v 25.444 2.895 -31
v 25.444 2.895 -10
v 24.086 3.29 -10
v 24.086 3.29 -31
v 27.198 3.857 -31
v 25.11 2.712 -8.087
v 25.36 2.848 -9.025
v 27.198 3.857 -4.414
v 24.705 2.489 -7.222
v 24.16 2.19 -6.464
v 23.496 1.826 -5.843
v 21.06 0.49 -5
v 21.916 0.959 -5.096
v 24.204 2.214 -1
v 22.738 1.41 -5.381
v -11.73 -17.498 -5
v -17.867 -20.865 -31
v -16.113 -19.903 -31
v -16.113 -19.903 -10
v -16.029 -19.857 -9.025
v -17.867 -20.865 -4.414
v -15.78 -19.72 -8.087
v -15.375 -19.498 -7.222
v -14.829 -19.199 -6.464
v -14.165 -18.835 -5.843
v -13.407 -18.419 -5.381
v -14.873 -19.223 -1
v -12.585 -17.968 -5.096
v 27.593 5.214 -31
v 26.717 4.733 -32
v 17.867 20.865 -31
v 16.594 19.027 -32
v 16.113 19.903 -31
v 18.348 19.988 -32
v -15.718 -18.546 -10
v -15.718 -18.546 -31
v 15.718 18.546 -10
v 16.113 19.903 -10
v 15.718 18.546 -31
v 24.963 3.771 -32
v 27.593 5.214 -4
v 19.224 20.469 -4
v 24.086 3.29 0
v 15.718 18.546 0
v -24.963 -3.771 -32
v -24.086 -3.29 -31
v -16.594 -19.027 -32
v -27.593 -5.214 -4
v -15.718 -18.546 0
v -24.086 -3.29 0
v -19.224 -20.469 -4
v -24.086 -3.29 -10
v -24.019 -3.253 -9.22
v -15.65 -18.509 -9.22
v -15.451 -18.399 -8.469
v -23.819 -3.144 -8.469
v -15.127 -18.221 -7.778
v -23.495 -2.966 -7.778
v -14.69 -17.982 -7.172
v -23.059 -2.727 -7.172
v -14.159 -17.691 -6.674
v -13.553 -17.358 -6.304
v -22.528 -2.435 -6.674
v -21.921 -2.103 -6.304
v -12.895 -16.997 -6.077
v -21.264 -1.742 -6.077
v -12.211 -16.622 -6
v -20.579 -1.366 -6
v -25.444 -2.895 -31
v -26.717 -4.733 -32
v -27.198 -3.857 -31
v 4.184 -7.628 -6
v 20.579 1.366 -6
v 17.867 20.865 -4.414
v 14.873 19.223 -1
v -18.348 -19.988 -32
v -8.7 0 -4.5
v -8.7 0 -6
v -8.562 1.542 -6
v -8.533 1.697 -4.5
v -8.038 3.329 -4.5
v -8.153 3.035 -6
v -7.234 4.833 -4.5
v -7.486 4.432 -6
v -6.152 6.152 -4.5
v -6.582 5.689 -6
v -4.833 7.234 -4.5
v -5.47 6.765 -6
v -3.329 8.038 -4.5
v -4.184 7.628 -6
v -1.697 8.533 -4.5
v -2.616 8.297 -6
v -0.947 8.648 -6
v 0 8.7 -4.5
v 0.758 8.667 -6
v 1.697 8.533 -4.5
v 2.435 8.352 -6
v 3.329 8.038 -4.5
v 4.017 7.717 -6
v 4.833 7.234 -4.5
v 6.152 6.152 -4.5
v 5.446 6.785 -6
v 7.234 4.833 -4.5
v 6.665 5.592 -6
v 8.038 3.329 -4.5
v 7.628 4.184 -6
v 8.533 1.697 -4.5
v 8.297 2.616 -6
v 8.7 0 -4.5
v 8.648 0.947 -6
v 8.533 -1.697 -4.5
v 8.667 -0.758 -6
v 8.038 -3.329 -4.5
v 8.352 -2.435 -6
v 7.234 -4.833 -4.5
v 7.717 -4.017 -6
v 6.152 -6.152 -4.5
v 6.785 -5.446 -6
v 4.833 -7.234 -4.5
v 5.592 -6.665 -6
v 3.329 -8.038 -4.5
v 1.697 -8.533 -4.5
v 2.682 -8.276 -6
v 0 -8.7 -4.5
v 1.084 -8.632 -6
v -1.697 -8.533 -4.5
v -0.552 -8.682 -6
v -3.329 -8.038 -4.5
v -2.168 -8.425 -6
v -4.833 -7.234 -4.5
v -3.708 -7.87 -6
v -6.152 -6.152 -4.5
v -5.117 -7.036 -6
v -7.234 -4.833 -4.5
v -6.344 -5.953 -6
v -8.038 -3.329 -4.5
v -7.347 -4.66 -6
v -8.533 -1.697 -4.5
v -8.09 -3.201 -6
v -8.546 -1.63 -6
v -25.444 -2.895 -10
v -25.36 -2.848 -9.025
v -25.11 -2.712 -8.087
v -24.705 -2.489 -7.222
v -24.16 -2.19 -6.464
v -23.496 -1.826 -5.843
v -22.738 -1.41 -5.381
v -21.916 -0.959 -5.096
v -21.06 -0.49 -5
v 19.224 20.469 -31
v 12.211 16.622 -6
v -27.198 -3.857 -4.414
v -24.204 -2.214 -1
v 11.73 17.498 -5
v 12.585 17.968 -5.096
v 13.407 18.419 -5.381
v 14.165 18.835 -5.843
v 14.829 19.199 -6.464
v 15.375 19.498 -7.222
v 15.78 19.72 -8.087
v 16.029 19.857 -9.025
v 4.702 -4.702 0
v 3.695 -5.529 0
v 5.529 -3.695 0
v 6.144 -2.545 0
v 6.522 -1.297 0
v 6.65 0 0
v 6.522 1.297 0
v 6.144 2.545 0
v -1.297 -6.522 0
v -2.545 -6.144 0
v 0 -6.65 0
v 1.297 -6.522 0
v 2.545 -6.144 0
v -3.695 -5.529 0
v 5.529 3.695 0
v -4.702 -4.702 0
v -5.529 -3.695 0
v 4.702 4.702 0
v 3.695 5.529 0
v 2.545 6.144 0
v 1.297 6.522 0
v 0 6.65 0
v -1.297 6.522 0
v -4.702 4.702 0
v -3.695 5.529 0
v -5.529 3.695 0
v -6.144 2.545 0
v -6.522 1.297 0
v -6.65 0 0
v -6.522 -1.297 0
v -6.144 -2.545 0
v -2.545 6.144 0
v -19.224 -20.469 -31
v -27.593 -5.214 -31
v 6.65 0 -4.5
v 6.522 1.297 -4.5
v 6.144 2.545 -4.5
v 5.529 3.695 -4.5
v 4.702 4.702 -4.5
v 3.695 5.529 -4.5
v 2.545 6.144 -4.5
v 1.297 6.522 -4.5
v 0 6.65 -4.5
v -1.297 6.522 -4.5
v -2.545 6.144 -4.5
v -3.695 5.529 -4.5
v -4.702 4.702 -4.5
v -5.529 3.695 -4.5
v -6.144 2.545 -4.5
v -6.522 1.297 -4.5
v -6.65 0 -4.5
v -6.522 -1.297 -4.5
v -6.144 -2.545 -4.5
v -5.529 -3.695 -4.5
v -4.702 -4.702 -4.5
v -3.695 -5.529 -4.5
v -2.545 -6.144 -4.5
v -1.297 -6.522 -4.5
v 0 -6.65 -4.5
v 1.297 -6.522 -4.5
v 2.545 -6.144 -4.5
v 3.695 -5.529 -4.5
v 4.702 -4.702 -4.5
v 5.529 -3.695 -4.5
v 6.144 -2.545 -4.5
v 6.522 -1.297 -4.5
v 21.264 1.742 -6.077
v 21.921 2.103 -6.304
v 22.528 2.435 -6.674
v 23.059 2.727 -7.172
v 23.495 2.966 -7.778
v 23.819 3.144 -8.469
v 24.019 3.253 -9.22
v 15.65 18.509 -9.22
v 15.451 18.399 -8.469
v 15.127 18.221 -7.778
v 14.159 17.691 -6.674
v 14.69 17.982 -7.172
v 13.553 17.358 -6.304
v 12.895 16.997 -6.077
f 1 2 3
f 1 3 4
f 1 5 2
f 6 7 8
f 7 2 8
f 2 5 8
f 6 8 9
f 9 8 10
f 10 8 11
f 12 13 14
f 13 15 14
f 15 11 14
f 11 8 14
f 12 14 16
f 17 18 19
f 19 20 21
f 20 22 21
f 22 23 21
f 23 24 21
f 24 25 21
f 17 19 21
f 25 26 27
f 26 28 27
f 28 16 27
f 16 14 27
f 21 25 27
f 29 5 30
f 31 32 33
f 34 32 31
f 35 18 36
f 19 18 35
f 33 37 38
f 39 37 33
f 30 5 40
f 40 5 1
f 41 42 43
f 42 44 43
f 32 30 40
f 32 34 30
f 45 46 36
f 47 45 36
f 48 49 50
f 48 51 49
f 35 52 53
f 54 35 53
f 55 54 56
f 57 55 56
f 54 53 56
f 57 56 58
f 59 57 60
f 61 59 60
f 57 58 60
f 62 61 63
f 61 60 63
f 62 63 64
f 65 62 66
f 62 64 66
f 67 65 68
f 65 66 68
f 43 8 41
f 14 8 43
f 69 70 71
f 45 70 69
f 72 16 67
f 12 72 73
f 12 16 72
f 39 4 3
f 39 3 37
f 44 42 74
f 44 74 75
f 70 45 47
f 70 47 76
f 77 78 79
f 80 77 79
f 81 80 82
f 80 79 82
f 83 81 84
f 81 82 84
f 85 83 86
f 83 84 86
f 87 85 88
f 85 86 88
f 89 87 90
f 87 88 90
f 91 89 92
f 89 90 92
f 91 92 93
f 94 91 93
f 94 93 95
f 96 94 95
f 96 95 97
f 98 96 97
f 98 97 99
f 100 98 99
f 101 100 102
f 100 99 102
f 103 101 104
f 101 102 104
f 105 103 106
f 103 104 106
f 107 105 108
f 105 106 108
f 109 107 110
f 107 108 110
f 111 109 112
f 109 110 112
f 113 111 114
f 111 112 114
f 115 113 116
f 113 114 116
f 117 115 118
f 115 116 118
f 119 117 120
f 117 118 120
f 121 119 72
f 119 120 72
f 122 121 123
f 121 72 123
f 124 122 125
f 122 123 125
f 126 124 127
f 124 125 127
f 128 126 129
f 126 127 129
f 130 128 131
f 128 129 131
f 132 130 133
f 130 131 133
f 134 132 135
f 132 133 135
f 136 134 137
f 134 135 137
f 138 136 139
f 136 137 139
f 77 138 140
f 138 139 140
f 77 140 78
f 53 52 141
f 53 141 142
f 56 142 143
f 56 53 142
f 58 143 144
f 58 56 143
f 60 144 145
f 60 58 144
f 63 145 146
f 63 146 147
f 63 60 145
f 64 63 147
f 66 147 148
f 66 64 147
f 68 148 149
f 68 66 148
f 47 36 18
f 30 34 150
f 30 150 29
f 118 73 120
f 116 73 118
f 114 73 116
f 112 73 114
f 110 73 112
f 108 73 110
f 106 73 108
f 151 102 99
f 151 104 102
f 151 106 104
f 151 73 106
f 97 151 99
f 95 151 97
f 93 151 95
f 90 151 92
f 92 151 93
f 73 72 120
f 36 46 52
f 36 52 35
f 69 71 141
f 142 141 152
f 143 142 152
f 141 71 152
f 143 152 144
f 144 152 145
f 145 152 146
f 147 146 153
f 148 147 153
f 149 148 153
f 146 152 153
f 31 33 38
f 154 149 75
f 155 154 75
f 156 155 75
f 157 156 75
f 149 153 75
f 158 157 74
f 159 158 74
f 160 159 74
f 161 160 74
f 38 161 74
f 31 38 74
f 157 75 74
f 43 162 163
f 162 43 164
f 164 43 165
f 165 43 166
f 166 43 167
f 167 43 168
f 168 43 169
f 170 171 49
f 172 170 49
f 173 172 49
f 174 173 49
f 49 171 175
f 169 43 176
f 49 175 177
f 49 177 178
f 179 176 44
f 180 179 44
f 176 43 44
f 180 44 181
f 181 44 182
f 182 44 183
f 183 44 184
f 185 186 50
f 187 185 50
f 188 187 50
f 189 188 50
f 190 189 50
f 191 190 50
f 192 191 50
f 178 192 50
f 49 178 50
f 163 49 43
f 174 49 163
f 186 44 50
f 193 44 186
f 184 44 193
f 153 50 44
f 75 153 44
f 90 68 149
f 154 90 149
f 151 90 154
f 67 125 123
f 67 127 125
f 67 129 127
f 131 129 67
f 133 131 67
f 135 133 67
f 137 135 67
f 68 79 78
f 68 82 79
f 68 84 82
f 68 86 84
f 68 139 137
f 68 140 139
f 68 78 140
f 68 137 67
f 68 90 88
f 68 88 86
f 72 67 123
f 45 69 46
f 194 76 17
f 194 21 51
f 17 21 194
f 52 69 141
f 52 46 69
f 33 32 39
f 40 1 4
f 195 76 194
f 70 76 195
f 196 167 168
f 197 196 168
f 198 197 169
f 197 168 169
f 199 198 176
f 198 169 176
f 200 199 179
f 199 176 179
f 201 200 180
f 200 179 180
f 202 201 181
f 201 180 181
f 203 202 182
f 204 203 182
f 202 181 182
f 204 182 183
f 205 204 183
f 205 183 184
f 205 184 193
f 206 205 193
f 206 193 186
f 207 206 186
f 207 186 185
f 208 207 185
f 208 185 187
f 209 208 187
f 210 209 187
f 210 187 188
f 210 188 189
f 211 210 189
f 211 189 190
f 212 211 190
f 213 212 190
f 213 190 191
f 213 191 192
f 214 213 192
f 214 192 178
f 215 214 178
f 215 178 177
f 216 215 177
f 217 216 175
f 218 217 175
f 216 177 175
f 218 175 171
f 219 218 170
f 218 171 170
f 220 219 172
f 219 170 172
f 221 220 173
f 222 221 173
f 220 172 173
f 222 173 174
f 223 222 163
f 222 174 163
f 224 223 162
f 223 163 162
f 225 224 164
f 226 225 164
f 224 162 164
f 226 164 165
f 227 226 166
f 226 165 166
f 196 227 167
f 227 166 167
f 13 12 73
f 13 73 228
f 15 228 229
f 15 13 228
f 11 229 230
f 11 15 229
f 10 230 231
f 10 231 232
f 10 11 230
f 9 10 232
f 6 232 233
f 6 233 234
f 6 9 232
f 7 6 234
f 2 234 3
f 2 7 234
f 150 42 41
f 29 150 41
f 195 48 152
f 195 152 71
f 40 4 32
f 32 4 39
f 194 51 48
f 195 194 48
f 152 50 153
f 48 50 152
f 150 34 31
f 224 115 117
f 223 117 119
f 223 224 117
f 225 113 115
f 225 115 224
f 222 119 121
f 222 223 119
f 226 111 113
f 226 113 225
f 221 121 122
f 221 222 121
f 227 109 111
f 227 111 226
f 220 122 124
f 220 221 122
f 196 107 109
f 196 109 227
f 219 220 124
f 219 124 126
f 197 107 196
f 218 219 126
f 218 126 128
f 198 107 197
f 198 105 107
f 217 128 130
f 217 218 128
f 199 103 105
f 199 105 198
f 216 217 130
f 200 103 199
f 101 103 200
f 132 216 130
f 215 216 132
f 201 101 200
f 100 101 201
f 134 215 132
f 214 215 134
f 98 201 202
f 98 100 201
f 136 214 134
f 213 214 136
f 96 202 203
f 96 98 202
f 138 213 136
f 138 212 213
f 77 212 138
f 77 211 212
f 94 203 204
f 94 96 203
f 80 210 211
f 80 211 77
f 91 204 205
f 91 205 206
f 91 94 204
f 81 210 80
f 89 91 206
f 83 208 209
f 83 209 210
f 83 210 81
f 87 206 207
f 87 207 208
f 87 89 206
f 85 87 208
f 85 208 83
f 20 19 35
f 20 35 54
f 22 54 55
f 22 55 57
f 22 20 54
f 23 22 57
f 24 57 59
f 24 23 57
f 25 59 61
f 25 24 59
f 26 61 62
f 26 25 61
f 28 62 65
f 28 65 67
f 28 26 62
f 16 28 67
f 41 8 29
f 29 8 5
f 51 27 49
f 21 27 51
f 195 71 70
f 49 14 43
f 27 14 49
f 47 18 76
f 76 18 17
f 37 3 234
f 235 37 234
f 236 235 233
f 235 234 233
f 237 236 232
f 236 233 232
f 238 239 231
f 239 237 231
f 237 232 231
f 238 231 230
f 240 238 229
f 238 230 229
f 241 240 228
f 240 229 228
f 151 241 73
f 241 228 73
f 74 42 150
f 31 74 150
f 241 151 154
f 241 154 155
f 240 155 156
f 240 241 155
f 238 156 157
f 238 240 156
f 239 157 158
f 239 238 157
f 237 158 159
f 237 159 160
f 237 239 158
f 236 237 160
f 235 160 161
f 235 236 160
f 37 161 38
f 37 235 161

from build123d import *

# Parameters (mm, degrees)
SKETCH1_R           = 6.650000000000002
BOSS_EXTRUDE1_DEPTH = 6
BOSS_EXTRUDE2_DEPTH = 32
FILLET1_R           = 4
CHAMFER1_SIZE       = 4
CHAMFER2_SIZE       = 1
SKETCH3_R           = 8.699999999995331
CUT_EXTRUDE1_DEPTH  = 1.5


with BuildPart() as part:
    # Sketch1 → Boss-Extrude1 (new body)
    with BuildSketch(Plane.XY):
        Polygon((15.23657634098733, 19.422325849528544), (24.56734683192624, 2.4136009694730585), (24.12897763398666, 2.173117193933393), (-14.79820714304776, -19.1818420739889), (-15.236576340987371, -19.42232584952858), (-24.567346831926308, -2.4136009694729568), (-24.12897763398673, -2.173117193933293), (14.798207143047753, 19.181842073988882), align=None)
        Circle(SKETCH1_R, mode=Mode.SUBTRACT)
    extrude(amount=-BOSS_EXTRUDE1_DEPTH)

    # Sketch2 → Boss-Extrude2 (add)
    with BuildSketch(Plane.XY):
        Polygon((24.56734683192624, 2.4136009694730585), (15.23657634098733, 19.422325849528544), (18.743529924503946, 21.34619605384586), (28.07430041544286, 4.337471173790374), align=None)
        Polygon((-24.567346831926308, -2.4136009694729568), (-15.236576340987371, -19.42232584952858), (-18.743529924503996, -21.346196053845887), (-28.074300415442934, -4.337471173790264), align=None)
    extrude(amount=-BOSS_EXTRUDE2_DEPTH)

    # Fillet1
    fillet1_edges = [part.edges().sort_by_distance(p)[0] for p in [
        (19.901961586456785, 10.917963409500802, -6),
        (-19.90196158645684, -10.917963409500768, -6),
    ]]
    fillet(fillet1_edges, radius=FILLET1_R)

    # Chamfer1
    chamfer1_edges = [part.edges().sort_by_distance(p)[0] for p in [
        (23.408915169973405, 12.841833613818116, 0),
        (-23.408915169973465, -12.841833613818075, 0),
    ]]
    chamfer(chamfer1_edges, length=CHAMFER1_SIZE)

    # Chamfer2
    chamfer2_edges = [part.edges().sort_by_distance(p)[0] for p in [
        (26.32082362368455, 3.375536071631716, -32),
        (28.07430041544286, 4.337471173790374, -18),
        (24.56734683192624, 2.4136009694730585, -21),
        (19.901961586456785, 10.917963409500802, -32),
        (16.990053132745636, 20.384260951687203, -32),
        (15.23657634098733, 19.422325849528544, -21),
        (23.408915169973405, 12.841833613818116, -32),
        (18.743529924503946, 21.34619605384586, -18),
        (-26.32082362368462, -3.3755360716316103, -32),
        (-28.074300415442934, -4.337471173790264, -18),
        (-24.567346831926308, -2.4136009694729568, -21),
        (-19.90196158645684, -10.917963409500768, -32),
        (-16.990053132745683, -20.38426095168723, -32),
        (-15.236576340987371, -19.42232584952858, -21),
        (-23.408915169973465, -12.841833613818075, -32),
        (-18.743529924503996, -21.346196053845887, -18),
        (4.665385245469443, -8.504362440027757, -6),
        (-4.665385245469494, 8.504362440027792, -6),
        (-14.209413417681859, -18.858837312806703, -7.171572875253809),
        (-23.540183908620747, -1.8501124327511644, -7.171572875253809),
        (14.209413417681818, 18.85883731280668, -7.171572875253809),
        (23.54018390862069, 1.8501124327512626, -7.171572875253809),
        (-4.665385245469494, 8.504362440027798, 0),
        (4.66538524546943, -8.504362440027759, 0),
        (26.32082362368455, 3.375536071631717, -2.0000000000000004),
        (-16.99005313274572, -20.38426095168716, -2.0000000000000018),
        (16.990053132745686, 20.384260951687114, -1.9999999999999964),
        (-26.32082362368462, -3.3755360716316103, -2.000000000000001),
    ]]
    chamfer(chamfer2_edges, length=CHAMFER2_SIZE)

    # Sketch3 → Cut-Extrude1 (cut)
    with BuildSketch(Plane(origin=(0, 0, -6), x_dir=(-1, 0, 0), z_dir=(0, 0, -1))):
        Circle(SKETCH3_R)
    extrude(amount=-CUT_EXTRUDE1_DEPTH, mode=Mode.SUBTRACT)


solid = part.part
